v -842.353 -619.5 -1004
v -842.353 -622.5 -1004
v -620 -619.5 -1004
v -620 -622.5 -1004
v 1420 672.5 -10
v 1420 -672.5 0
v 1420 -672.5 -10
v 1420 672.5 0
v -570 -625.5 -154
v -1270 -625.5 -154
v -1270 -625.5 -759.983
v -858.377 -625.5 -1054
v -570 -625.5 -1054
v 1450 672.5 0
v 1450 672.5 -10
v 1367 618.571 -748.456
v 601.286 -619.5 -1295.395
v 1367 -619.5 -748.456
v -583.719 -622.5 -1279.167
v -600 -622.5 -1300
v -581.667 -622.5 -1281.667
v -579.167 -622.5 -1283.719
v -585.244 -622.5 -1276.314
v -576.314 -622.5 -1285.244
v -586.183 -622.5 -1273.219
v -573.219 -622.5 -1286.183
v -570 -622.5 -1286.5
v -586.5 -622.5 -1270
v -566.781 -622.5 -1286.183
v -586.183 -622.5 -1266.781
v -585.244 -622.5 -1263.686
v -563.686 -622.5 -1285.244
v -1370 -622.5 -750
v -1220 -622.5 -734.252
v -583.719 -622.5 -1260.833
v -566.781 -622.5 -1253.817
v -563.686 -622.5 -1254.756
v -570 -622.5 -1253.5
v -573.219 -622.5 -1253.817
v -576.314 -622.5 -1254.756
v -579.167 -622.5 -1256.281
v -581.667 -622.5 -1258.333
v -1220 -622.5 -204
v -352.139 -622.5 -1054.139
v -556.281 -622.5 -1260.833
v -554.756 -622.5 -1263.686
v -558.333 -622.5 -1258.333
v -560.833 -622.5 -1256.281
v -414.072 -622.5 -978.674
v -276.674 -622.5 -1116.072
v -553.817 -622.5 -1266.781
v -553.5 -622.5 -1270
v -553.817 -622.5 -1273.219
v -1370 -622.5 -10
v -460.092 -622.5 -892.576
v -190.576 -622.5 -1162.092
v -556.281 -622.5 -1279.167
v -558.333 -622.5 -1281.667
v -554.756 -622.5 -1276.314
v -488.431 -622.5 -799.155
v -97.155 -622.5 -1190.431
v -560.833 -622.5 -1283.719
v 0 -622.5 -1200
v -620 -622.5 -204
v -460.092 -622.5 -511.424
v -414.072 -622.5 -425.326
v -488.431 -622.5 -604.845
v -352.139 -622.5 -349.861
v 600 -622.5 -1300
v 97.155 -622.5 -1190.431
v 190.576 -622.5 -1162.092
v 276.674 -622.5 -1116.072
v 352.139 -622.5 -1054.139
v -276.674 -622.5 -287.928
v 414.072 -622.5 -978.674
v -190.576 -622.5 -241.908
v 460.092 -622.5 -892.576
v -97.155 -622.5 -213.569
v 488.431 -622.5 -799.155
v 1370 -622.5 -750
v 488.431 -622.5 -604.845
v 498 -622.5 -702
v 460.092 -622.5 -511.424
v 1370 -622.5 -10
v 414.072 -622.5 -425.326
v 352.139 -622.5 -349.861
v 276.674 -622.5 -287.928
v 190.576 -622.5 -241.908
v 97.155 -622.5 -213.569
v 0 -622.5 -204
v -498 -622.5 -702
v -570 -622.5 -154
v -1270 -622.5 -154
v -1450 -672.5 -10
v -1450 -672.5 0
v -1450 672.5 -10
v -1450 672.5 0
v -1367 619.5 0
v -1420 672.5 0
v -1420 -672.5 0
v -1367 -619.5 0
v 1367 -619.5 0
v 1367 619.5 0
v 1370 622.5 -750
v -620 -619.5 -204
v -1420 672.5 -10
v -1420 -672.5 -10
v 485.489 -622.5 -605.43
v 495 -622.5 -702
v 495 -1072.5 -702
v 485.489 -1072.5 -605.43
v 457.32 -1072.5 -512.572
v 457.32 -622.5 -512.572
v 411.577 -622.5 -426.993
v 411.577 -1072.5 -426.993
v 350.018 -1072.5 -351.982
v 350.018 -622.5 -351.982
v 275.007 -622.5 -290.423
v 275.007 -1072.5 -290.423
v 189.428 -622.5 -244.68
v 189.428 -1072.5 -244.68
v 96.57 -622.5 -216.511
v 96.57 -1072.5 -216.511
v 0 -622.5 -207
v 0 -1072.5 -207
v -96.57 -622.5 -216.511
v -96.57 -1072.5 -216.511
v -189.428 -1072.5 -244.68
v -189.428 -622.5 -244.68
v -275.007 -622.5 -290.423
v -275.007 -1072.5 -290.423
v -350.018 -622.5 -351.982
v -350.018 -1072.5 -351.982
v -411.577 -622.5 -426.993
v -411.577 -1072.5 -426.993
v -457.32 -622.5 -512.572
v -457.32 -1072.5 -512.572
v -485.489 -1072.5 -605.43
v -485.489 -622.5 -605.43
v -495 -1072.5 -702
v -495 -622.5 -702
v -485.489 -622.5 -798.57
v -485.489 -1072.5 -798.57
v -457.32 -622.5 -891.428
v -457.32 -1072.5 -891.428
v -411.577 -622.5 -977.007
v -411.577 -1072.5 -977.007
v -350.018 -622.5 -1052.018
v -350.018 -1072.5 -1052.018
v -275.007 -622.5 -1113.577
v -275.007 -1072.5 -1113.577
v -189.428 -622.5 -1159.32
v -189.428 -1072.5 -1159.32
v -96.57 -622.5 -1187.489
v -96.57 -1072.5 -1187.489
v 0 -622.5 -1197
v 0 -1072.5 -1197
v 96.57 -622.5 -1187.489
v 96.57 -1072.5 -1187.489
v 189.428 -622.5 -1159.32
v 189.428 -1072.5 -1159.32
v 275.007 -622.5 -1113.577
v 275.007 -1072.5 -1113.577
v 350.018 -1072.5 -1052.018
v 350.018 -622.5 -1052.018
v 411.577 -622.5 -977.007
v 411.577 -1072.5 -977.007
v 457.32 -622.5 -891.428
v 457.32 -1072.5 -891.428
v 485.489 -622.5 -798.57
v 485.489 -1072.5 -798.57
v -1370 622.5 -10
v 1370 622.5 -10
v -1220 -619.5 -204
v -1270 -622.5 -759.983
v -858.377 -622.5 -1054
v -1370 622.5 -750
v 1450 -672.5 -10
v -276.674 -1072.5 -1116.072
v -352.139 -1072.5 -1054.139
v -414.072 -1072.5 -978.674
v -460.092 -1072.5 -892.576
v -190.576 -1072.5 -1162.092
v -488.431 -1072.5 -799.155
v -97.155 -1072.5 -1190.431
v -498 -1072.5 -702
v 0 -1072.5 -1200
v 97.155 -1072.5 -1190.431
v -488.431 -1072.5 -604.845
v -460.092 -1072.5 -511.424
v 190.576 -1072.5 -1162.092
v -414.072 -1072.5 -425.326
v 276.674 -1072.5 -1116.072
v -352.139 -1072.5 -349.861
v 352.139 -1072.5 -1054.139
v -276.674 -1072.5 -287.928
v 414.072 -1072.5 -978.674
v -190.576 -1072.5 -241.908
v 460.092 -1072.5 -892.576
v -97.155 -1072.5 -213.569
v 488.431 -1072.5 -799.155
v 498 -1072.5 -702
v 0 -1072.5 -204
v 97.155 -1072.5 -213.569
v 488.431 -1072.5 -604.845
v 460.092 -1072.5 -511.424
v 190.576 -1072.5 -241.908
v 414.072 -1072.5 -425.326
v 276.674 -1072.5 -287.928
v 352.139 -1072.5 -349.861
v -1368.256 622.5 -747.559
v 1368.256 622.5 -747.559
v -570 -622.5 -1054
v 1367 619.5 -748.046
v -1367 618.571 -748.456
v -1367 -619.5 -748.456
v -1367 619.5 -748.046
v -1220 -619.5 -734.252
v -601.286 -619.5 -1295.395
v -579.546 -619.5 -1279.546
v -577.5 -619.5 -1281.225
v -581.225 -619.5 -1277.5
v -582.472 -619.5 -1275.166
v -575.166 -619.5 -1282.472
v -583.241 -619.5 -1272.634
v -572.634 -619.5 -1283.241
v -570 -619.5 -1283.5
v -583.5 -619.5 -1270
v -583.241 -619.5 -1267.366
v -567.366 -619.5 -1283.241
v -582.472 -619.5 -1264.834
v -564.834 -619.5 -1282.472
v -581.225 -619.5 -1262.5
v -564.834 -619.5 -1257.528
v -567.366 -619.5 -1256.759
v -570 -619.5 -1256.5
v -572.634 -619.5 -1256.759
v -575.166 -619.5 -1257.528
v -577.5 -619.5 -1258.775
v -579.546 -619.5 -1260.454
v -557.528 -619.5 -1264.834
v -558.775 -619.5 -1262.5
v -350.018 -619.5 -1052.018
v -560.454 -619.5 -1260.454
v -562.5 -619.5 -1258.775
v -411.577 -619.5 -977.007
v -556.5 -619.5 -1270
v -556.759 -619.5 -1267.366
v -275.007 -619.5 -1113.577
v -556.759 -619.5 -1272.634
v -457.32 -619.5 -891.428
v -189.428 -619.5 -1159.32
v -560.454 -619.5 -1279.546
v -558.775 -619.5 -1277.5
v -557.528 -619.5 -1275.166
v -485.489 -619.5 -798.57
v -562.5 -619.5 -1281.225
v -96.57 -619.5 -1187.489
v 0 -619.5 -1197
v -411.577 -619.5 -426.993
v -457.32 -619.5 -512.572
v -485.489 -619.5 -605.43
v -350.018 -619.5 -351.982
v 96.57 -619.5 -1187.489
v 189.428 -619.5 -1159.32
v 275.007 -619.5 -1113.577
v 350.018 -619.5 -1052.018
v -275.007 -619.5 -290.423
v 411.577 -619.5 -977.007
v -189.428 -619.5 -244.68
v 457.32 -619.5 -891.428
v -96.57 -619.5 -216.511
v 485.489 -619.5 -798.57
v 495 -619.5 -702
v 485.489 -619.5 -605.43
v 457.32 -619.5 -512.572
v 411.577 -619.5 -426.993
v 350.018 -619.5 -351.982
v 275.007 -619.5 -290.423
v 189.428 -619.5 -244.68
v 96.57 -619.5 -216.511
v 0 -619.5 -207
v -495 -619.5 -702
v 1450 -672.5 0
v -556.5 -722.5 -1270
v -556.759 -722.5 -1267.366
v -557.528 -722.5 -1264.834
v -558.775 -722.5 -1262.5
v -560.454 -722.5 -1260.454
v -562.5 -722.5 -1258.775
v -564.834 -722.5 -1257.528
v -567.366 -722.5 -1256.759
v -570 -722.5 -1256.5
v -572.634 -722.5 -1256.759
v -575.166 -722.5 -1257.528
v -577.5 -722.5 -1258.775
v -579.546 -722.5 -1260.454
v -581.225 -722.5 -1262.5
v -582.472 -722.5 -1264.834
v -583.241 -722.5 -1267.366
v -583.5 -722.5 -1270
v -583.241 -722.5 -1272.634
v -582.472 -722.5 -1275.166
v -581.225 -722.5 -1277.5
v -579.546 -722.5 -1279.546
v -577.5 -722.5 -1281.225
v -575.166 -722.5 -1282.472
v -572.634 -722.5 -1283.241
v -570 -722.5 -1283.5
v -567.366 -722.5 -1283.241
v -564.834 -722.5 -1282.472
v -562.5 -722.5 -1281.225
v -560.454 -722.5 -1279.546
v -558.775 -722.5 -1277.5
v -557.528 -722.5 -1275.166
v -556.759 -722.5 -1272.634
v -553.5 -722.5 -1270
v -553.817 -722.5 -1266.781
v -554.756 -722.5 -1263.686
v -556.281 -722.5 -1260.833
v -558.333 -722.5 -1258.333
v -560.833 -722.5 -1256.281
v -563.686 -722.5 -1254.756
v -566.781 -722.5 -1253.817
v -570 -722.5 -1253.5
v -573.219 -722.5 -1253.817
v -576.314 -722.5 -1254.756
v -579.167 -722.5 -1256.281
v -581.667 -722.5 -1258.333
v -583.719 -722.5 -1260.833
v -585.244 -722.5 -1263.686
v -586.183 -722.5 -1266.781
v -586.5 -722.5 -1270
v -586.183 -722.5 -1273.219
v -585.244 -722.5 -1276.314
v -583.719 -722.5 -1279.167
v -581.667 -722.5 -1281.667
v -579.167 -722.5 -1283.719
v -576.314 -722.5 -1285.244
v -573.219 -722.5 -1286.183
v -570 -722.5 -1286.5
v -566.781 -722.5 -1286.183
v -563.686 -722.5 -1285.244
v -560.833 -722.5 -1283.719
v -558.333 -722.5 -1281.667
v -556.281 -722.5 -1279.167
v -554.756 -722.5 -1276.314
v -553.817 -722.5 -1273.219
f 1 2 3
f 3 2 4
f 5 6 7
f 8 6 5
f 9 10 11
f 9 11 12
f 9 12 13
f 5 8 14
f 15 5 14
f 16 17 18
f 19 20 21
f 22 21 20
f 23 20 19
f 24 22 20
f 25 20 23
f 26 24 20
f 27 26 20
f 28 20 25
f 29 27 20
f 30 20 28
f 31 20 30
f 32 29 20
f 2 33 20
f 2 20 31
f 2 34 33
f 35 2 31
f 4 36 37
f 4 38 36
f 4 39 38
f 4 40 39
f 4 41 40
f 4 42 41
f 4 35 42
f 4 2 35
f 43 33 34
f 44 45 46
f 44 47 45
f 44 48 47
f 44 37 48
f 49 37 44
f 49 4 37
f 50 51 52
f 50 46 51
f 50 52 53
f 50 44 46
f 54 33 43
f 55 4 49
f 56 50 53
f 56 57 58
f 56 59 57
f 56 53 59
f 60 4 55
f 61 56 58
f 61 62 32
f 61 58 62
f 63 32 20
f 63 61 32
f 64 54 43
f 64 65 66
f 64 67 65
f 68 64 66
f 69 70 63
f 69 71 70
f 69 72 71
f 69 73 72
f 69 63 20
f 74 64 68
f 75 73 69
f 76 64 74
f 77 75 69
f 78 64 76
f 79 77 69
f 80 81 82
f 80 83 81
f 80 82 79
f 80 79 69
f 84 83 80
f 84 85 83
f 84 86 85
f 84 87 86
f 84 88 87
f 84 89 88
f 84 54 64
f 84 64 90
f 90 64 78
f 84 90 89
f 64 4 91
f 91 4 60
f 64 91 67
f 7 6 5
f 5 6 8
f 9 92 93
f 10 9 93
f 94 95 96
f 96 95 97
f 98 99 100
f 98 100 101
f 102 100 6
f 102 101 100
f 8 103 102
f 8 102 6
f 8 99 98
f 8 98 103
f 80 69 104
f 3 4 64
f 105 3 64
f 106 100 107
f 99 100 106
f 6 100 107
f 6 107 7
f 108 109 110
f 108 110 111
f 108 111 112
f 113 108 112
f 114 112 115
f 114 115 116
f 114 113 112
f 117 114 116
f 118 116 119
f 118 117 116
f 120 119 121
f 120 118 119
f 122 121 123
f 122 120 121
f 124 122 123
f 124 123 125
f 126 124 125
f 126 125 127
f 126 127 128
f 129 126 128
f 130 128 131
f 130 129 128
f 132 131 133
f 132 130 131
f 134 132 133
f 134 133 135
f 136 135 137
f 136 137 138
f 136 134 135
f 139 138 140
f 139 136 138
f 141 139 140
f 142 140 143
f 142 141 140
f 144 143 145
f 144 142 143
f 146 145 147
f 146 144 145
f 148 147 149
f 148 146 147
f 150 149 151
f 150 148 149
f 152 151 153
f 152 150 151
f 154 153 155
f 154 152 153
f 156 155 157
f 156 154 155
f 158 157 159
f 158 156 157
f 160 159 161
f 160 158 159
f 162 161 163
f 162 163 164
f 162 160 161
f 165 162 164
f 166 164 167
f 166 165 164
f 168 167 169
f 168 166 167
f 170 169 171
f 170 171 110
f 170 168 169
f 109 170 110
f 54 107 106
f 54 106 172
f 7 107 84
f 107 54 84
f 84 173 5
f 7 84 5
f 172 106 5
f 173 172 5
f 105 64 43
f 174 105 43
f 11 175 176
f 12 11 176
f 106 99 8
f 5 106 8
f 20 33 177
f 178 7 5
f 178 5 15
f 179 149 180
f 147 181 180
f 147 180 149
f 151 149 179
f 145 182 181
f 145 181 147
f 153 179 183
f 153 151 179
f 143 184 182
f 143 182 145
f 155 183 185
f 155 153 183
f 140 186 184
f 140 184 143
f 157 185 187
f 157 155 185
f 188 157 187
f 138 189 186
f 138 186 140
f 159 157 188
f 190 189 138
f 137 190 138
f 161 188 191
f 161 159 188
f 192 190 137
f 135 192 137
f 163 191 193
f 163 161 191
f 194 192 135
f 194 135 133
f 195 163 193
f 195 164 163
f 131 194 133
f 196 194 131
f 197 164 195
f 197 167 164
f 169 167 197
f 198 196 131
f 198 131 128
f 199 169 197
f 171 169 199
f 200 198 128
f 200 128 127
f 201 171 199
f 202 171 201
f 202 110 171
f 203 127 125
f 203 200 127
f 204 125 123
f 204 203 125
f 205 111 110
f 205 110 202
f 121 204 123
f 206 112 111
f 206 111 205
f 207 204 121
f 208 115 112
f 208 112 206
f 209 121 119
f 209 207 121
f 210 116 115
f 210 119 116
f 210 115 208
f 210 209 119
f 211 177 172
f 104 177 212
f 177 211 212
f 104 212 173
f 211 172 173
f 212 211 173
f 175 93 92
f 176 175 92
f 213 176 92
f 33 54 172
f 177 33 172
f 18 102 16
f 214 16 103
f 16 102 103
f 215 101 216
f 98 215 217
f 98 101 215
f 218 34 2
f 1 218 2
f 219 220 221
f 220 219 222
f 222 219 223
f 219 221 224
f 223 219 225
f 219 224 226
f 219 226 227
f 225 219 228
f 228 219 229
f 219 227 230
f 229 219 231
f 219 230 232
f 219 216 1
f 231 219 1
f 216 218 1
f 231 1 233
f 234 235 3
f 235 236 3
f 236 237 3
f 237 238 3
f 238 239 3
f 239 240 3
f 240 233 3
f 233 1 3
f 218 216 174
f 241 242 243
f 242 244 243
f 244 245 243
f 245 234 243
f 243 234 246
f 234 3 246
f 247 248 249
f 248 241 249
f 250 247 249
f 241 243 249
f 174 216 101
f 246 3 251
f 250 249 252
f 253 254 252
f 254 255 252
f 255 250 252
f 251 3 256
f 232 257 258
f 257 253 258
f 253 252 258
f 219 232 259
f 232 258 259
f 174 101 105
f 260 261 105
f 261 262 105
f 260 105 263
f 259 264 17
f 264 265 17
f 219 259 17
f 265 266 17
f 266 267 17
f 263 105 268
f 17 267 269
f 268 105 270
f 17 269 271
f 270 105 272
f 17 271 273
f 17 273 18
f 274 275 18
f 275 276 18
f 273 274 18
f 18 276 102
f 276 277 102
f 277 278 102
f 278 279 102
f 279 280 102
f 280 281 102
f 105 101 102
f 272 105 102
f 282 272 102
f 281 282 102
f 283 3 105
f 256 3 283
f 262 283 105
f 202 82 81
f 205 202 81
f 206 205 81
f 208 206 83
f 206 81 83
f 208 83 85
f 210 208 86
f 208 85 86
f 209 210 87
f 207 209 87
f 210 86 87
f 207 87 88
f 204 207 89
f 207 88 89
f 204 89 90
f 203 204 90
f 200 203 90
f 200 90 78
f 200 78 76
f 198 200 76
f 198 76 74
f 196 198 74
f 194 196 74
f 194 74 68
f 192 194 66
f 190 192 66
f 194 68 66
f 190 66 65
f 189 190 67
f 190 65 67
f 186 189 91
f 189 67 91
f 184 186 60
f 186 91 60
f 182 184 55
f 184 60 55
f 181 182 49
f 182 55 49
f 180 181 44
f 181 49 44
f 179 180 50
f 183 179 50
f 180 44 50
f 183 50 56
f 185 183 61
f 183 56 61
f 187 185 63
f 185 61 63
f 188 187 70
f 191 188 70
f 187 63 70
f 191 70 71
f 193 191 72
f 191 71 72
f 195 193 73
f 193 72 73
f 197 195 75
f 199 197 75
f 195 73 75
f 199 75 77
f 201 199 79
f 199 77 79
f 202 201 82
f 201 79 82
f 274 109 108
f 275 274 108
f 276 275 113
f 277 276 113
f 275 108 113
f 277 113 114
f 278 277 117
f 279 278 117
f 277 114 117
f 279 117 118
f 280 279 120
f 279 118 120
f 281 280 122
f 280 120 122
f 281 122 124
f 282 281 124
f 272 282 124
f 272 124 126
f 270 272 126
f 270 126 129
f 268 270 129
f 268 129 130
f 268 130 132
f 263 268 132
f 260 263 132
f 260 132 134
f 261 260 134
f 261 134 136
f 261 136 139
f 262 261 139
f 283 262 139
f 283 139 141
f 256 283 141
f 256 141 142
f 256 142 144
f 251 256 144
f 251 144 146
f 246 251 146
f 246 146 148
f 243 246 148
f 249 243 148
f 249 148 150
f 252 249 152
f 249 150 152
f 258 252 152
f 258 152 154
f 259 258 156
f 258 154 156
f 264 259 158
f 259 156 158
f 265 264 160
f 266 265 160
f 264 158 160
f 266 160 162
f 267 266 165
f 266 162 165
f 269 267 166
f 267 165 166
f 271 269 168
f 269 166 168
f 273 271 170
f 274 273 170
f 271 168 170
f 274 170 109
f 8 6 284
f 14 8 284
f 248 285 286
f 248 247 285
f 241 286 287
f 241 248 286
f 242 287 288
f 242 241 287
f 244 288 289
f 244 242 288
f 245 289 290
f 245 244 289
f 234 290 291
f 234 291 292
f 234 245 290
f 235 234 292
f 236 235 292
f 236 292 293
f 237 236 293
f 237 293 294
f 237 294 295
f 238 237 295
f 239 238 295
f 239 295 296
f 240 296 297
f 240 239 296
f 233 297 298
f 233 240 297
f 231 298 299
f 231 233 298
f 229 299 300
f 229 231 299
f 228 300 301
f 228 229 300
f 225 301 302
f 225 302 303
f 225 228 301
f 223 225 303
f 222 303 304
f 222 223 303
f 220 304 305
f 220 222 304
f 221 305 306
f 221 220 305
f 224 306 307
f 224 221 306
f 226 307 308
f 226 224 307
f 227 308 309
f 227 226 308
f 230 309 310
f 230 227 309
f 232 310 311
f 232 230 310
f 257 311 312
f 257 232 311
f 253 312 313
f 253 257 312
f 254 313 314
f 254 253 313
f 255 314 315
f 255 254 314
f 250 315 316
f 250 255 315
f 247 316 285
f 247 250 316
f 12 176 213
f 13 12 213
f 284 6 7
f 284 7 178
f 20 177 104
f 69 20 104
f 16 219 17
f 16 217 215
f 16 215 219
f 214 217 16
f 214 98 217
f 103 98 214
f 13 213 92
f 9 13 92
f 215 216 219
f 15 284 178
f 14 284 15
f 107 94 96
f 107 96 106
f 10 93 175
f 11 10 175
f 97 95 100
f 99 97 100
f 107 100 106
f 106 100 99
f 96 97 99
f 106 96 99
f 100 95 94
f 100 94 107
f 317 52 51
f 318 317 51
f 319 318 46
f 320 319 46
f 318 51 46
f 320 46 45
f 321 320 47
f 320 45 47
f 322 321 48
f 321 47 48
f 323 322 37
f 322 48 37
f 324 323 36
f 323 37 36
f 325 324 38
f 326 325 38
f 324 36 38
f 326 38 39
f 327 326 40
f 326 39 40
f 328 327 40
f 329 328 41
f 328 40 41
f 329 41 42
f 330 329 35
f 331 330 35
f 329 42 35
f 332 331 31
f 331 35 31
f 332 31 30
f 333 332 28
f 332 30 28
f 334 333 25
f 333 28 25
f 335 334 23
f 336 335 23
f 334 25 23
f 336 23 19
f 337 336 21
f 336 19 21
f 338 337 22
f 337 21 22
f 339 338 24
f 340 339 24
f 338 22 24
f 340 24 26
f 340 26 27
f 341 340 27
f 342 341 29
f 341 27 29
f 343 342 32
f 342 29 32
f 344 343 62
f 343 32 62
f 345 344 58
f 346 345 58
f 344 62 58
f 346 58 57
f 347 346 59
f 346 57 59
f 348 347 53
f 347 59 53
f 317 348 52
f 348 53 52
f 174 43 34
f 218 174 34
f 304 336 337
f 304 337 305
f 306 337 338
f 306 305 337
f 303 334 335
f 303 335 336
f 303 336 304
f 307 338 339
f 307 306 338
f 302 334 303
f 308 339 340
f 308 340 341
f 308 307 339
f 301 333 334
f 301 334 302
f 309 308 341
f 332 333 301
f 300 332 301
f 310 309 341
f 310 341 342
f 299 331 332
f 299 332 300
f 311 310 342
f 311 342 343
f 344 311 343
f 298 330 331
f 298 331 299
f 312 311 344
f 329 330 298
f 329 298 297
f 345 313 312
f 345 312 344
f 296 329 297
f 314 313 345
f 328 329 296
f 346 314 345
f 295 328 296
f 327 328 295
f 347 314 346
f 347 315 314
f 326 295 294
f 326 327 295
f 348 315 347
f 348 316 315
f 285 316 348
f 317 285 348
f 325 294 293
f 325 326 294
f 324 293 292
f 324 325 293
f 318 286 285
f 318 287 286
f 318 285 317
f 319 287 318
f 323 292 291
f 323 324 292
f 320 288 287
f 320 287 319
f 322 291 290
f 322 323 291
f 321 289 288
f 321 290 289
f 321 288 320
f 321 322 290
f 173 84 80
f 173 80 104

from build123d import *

# Parameters (mm, degrees)
F0_W      = 2740
F0_H      = 1245
F0_W_2    = 2734
F0_H_2    = 1239
F1_DEPTH  = 1300
F2_W      = 2840
F2_H      = 1345
F2_W_2    = 2740
F2_H_2    = 1245
F3_DEPTH  = 10
F6_W      = 3756.6298246384
F6_H      = 2810.5971813202
F7_DEPTH  = 523.3006197248
F9_DEPTH  = 3
F15_W     = 5581.1772346497
F15_H     = 5849.4508266449
F16_DEPTH = 476.6163188497
F18_W     = 5153.7227630615
F18_H     = 5582.9391479492
F19_DEPTH = 476.6163188497
F21_DEPTH = 3
F23_DEPTH = 3
F24_R     = 495
F25_DEPTH = 25
F26_R     = 498
F26_R_2   = 495
F27_DEPTH = 450
F29_DEPTH = 25
F30_R     = 13.5
F31_DEPTH = 3
F32_R     = 16.5
F32_R_2   = 13.5
F33_DEPTH = 100
F35_DEPTH = 3
F36_W     = 30
F36_H     = 1345
F37_DEPTH = 10


with BuildPart() as f1:
    # F0 (on Top) → F1 (new body)
    with BuildSketch(Plane.XY):
        Rectangle(F0_W, F0_H)
        Rectangle(F0_W_2, F0_H_2, mode=Mode.SUBTRACT)
    extrude(amount=-F1_DEPTH)

    # F2 (on Top) → F3 (join)
    with BuildSketch(Plane.XY):
        Rectangle(F2_W, F2_H)
        Rectangle(F2_W_2, F2_H_2, mode=Mode.SUBTRACT)
    extrude(amount=-F3_DEPTH)

    # F6 (on face) → F7 (cut, through all)
    with BuildSketch(Plane(origin=(0, 378.8714052442, -857.6270900528), x_dir=(1, 0, 0), z_dir=(0, -0.4040923704, 0.914718184))):
        with Locations((-80.258667469, -286.9104146957)):
            Rectangle(F6_W, F6_H)
    extrude(amount=-F7_DEPTH, mode=Mode.SUBTRACT)

    # F8 (on face) → F9 (join)
    with BuildSketch(Plane(origin=(0, 378.8714052442, -857.6270900528), x_dir=(1, 0, 0), z_dir=(0, -0.4040923704, 0.914718184))):
        Polygon((1370, 263.5997201783), (1370, 266.3427917101), (-1370, 266.3427917101), (-1370, 263.5997201783), (-1370, -1091.4524524626), (-1367, -1091.4524524626), (1367, -1091.4524524626), (1370, -1091.4524524626), align=None)
    extrude(amount=F9_DEPTH)

    # F15 (on face) → F16 (cut, through all)
    with BuildSketch(Plane(origin=(-817.5675675676, 0, -1144.5945945946), x_dir=(0.8137334712, 0, -0.5812381937), z_dir=(-0.5812381937, 0, -0.8137334712))):
        with Locations((354.1152477264, 144.3899869919)):
            Rectangle(F15_W, F15_H)
    extrude(amount=F16_DEPTH, mode=Mode.SUBTRACT)

    # F18 (on face) → F19 (cut, through all)
    with BuildSketch(Plane(origin=(817.5675675676, 0, -1144.5945945946), x_dir=(0.8137334712, 0, 0.5812381937), z_dir=(-0.5812381937, 0, 0.8137334712))):
        with Locations((-148.3383178711, 83.601474762)):
            Rectangle(F18_W, F18_H)
    extrude(amount=-F19_DEPTH, mode=Mode.SUBTRACT)

    # F20 (on face) → F21 (join)
    with BuildSketch(Plane(origin=(-817.5675675676, 0, -1144.5945945946), x_dir=(0.8137334712, 0, -0.5812381937), z_dir=(-0.5812381937, 0, -0.8137334712))):
        Polygon((-678.8862102639, 622.5), (-678.8862102639, -622.5), (267.3695691108, 622.5), align=None)
    extrude(amount=-F21_DEPTH)

    # F22 (on face) → F23 (join)
    with BuildSketch(Plane(origin=(817.5675675676, 0, -1144.5945945946), x_dir=(0.8137334712, 0, 0.5812381937), z_dir=(-0.5812381937, 0, 0.8137334712))):
        Polygon((-267.3695691108, -622.5), (678.8862102639, -622.5), (678.8862102639, 622.5), align=None)
    extrude(amount=F23_DEPTH)

    # F24 (on face) → F25 (cut)
    with BuildSketch(Plane.XZ.offset(622.5)):
        with Locations((0, -702)):
            Circle(F24_R)
    extrude(amount=-F25_DEPTH, mode=Mode.SUBTRACT)

    # F26 (on face) → F27 (join)
    with BuildSketch(Plane.XZ.offset(622.5)):
        with Locations((0, -702)):
            Circle(F26_R)
        with Locations((0, -702)):
            Circle(F26_R_2, mode=Mode.SUBTRACT)
    extrude(amount=F27_DEPTH)

    # F28 (on face) → F29 (cut)
    with BuildSketch(Plane.XZ.offset(622.5)):
        Polygon((-620, -204), (-1220, -204), (-1220, -734.2524961851), (-842.3534946591, -1004), (-620, -1004), align=None)
    extrude(amount=-F29_DEPTH, mode=Mode.SUBTRACT)

    # F30 (on face) → F31 (cut)
    with BuildSketch(Plane.XZ.offset(622.5)):
        with Locations((-570, -1270)):
            Circle(F30_R)
    extrude(amount=-F31_DEPTH, mode=Mode.SUBTRACT)

    # F32 (on face) → F33 (join)
    with BuildSketch(Plane.XZ.offset(622.5)):
        with Locations((-570, -1270)):
            Circle(F32_R)
        with Locations((-570, -1270)):
            Circle(F32_R_2, mode=Mode.SUBTRACT)
    extrude(amount=F33_DEPTH)


with BuildPart() as f35:
    # F34 (on face) → F35 (new body)
    with BuildSketch(Plane.XZ.offset(622.5)):
        Polygon((-1270, -154), (-1270, -759.9833909497), (-858.3767473296, -1054), (-570, -1054), (-570, -154), align=None)
    extrude(amount=F35_DEPTH)


with BuildPart() as f37:
    # F36 (on face) → F37 (new body)
    with BuildSketch(Plane.XY):
        with Locations((-1435, 0)):
            Rectangle(F36_W, F36_H)
    extrude(amount=-F37_DEPTH)


with BuildPart() as f37b:
    # F36 (on face) → F37, piece 2 (new body)
    with BuildSketch(Plane.XY):
        with Locations((1435, 0)):
            Rectangle(F36_W, F36_H)
    extrude(amount=-F37_DEPTH)


solid = Compound([f1.part, f35.part, f37.part, f37b.part])
